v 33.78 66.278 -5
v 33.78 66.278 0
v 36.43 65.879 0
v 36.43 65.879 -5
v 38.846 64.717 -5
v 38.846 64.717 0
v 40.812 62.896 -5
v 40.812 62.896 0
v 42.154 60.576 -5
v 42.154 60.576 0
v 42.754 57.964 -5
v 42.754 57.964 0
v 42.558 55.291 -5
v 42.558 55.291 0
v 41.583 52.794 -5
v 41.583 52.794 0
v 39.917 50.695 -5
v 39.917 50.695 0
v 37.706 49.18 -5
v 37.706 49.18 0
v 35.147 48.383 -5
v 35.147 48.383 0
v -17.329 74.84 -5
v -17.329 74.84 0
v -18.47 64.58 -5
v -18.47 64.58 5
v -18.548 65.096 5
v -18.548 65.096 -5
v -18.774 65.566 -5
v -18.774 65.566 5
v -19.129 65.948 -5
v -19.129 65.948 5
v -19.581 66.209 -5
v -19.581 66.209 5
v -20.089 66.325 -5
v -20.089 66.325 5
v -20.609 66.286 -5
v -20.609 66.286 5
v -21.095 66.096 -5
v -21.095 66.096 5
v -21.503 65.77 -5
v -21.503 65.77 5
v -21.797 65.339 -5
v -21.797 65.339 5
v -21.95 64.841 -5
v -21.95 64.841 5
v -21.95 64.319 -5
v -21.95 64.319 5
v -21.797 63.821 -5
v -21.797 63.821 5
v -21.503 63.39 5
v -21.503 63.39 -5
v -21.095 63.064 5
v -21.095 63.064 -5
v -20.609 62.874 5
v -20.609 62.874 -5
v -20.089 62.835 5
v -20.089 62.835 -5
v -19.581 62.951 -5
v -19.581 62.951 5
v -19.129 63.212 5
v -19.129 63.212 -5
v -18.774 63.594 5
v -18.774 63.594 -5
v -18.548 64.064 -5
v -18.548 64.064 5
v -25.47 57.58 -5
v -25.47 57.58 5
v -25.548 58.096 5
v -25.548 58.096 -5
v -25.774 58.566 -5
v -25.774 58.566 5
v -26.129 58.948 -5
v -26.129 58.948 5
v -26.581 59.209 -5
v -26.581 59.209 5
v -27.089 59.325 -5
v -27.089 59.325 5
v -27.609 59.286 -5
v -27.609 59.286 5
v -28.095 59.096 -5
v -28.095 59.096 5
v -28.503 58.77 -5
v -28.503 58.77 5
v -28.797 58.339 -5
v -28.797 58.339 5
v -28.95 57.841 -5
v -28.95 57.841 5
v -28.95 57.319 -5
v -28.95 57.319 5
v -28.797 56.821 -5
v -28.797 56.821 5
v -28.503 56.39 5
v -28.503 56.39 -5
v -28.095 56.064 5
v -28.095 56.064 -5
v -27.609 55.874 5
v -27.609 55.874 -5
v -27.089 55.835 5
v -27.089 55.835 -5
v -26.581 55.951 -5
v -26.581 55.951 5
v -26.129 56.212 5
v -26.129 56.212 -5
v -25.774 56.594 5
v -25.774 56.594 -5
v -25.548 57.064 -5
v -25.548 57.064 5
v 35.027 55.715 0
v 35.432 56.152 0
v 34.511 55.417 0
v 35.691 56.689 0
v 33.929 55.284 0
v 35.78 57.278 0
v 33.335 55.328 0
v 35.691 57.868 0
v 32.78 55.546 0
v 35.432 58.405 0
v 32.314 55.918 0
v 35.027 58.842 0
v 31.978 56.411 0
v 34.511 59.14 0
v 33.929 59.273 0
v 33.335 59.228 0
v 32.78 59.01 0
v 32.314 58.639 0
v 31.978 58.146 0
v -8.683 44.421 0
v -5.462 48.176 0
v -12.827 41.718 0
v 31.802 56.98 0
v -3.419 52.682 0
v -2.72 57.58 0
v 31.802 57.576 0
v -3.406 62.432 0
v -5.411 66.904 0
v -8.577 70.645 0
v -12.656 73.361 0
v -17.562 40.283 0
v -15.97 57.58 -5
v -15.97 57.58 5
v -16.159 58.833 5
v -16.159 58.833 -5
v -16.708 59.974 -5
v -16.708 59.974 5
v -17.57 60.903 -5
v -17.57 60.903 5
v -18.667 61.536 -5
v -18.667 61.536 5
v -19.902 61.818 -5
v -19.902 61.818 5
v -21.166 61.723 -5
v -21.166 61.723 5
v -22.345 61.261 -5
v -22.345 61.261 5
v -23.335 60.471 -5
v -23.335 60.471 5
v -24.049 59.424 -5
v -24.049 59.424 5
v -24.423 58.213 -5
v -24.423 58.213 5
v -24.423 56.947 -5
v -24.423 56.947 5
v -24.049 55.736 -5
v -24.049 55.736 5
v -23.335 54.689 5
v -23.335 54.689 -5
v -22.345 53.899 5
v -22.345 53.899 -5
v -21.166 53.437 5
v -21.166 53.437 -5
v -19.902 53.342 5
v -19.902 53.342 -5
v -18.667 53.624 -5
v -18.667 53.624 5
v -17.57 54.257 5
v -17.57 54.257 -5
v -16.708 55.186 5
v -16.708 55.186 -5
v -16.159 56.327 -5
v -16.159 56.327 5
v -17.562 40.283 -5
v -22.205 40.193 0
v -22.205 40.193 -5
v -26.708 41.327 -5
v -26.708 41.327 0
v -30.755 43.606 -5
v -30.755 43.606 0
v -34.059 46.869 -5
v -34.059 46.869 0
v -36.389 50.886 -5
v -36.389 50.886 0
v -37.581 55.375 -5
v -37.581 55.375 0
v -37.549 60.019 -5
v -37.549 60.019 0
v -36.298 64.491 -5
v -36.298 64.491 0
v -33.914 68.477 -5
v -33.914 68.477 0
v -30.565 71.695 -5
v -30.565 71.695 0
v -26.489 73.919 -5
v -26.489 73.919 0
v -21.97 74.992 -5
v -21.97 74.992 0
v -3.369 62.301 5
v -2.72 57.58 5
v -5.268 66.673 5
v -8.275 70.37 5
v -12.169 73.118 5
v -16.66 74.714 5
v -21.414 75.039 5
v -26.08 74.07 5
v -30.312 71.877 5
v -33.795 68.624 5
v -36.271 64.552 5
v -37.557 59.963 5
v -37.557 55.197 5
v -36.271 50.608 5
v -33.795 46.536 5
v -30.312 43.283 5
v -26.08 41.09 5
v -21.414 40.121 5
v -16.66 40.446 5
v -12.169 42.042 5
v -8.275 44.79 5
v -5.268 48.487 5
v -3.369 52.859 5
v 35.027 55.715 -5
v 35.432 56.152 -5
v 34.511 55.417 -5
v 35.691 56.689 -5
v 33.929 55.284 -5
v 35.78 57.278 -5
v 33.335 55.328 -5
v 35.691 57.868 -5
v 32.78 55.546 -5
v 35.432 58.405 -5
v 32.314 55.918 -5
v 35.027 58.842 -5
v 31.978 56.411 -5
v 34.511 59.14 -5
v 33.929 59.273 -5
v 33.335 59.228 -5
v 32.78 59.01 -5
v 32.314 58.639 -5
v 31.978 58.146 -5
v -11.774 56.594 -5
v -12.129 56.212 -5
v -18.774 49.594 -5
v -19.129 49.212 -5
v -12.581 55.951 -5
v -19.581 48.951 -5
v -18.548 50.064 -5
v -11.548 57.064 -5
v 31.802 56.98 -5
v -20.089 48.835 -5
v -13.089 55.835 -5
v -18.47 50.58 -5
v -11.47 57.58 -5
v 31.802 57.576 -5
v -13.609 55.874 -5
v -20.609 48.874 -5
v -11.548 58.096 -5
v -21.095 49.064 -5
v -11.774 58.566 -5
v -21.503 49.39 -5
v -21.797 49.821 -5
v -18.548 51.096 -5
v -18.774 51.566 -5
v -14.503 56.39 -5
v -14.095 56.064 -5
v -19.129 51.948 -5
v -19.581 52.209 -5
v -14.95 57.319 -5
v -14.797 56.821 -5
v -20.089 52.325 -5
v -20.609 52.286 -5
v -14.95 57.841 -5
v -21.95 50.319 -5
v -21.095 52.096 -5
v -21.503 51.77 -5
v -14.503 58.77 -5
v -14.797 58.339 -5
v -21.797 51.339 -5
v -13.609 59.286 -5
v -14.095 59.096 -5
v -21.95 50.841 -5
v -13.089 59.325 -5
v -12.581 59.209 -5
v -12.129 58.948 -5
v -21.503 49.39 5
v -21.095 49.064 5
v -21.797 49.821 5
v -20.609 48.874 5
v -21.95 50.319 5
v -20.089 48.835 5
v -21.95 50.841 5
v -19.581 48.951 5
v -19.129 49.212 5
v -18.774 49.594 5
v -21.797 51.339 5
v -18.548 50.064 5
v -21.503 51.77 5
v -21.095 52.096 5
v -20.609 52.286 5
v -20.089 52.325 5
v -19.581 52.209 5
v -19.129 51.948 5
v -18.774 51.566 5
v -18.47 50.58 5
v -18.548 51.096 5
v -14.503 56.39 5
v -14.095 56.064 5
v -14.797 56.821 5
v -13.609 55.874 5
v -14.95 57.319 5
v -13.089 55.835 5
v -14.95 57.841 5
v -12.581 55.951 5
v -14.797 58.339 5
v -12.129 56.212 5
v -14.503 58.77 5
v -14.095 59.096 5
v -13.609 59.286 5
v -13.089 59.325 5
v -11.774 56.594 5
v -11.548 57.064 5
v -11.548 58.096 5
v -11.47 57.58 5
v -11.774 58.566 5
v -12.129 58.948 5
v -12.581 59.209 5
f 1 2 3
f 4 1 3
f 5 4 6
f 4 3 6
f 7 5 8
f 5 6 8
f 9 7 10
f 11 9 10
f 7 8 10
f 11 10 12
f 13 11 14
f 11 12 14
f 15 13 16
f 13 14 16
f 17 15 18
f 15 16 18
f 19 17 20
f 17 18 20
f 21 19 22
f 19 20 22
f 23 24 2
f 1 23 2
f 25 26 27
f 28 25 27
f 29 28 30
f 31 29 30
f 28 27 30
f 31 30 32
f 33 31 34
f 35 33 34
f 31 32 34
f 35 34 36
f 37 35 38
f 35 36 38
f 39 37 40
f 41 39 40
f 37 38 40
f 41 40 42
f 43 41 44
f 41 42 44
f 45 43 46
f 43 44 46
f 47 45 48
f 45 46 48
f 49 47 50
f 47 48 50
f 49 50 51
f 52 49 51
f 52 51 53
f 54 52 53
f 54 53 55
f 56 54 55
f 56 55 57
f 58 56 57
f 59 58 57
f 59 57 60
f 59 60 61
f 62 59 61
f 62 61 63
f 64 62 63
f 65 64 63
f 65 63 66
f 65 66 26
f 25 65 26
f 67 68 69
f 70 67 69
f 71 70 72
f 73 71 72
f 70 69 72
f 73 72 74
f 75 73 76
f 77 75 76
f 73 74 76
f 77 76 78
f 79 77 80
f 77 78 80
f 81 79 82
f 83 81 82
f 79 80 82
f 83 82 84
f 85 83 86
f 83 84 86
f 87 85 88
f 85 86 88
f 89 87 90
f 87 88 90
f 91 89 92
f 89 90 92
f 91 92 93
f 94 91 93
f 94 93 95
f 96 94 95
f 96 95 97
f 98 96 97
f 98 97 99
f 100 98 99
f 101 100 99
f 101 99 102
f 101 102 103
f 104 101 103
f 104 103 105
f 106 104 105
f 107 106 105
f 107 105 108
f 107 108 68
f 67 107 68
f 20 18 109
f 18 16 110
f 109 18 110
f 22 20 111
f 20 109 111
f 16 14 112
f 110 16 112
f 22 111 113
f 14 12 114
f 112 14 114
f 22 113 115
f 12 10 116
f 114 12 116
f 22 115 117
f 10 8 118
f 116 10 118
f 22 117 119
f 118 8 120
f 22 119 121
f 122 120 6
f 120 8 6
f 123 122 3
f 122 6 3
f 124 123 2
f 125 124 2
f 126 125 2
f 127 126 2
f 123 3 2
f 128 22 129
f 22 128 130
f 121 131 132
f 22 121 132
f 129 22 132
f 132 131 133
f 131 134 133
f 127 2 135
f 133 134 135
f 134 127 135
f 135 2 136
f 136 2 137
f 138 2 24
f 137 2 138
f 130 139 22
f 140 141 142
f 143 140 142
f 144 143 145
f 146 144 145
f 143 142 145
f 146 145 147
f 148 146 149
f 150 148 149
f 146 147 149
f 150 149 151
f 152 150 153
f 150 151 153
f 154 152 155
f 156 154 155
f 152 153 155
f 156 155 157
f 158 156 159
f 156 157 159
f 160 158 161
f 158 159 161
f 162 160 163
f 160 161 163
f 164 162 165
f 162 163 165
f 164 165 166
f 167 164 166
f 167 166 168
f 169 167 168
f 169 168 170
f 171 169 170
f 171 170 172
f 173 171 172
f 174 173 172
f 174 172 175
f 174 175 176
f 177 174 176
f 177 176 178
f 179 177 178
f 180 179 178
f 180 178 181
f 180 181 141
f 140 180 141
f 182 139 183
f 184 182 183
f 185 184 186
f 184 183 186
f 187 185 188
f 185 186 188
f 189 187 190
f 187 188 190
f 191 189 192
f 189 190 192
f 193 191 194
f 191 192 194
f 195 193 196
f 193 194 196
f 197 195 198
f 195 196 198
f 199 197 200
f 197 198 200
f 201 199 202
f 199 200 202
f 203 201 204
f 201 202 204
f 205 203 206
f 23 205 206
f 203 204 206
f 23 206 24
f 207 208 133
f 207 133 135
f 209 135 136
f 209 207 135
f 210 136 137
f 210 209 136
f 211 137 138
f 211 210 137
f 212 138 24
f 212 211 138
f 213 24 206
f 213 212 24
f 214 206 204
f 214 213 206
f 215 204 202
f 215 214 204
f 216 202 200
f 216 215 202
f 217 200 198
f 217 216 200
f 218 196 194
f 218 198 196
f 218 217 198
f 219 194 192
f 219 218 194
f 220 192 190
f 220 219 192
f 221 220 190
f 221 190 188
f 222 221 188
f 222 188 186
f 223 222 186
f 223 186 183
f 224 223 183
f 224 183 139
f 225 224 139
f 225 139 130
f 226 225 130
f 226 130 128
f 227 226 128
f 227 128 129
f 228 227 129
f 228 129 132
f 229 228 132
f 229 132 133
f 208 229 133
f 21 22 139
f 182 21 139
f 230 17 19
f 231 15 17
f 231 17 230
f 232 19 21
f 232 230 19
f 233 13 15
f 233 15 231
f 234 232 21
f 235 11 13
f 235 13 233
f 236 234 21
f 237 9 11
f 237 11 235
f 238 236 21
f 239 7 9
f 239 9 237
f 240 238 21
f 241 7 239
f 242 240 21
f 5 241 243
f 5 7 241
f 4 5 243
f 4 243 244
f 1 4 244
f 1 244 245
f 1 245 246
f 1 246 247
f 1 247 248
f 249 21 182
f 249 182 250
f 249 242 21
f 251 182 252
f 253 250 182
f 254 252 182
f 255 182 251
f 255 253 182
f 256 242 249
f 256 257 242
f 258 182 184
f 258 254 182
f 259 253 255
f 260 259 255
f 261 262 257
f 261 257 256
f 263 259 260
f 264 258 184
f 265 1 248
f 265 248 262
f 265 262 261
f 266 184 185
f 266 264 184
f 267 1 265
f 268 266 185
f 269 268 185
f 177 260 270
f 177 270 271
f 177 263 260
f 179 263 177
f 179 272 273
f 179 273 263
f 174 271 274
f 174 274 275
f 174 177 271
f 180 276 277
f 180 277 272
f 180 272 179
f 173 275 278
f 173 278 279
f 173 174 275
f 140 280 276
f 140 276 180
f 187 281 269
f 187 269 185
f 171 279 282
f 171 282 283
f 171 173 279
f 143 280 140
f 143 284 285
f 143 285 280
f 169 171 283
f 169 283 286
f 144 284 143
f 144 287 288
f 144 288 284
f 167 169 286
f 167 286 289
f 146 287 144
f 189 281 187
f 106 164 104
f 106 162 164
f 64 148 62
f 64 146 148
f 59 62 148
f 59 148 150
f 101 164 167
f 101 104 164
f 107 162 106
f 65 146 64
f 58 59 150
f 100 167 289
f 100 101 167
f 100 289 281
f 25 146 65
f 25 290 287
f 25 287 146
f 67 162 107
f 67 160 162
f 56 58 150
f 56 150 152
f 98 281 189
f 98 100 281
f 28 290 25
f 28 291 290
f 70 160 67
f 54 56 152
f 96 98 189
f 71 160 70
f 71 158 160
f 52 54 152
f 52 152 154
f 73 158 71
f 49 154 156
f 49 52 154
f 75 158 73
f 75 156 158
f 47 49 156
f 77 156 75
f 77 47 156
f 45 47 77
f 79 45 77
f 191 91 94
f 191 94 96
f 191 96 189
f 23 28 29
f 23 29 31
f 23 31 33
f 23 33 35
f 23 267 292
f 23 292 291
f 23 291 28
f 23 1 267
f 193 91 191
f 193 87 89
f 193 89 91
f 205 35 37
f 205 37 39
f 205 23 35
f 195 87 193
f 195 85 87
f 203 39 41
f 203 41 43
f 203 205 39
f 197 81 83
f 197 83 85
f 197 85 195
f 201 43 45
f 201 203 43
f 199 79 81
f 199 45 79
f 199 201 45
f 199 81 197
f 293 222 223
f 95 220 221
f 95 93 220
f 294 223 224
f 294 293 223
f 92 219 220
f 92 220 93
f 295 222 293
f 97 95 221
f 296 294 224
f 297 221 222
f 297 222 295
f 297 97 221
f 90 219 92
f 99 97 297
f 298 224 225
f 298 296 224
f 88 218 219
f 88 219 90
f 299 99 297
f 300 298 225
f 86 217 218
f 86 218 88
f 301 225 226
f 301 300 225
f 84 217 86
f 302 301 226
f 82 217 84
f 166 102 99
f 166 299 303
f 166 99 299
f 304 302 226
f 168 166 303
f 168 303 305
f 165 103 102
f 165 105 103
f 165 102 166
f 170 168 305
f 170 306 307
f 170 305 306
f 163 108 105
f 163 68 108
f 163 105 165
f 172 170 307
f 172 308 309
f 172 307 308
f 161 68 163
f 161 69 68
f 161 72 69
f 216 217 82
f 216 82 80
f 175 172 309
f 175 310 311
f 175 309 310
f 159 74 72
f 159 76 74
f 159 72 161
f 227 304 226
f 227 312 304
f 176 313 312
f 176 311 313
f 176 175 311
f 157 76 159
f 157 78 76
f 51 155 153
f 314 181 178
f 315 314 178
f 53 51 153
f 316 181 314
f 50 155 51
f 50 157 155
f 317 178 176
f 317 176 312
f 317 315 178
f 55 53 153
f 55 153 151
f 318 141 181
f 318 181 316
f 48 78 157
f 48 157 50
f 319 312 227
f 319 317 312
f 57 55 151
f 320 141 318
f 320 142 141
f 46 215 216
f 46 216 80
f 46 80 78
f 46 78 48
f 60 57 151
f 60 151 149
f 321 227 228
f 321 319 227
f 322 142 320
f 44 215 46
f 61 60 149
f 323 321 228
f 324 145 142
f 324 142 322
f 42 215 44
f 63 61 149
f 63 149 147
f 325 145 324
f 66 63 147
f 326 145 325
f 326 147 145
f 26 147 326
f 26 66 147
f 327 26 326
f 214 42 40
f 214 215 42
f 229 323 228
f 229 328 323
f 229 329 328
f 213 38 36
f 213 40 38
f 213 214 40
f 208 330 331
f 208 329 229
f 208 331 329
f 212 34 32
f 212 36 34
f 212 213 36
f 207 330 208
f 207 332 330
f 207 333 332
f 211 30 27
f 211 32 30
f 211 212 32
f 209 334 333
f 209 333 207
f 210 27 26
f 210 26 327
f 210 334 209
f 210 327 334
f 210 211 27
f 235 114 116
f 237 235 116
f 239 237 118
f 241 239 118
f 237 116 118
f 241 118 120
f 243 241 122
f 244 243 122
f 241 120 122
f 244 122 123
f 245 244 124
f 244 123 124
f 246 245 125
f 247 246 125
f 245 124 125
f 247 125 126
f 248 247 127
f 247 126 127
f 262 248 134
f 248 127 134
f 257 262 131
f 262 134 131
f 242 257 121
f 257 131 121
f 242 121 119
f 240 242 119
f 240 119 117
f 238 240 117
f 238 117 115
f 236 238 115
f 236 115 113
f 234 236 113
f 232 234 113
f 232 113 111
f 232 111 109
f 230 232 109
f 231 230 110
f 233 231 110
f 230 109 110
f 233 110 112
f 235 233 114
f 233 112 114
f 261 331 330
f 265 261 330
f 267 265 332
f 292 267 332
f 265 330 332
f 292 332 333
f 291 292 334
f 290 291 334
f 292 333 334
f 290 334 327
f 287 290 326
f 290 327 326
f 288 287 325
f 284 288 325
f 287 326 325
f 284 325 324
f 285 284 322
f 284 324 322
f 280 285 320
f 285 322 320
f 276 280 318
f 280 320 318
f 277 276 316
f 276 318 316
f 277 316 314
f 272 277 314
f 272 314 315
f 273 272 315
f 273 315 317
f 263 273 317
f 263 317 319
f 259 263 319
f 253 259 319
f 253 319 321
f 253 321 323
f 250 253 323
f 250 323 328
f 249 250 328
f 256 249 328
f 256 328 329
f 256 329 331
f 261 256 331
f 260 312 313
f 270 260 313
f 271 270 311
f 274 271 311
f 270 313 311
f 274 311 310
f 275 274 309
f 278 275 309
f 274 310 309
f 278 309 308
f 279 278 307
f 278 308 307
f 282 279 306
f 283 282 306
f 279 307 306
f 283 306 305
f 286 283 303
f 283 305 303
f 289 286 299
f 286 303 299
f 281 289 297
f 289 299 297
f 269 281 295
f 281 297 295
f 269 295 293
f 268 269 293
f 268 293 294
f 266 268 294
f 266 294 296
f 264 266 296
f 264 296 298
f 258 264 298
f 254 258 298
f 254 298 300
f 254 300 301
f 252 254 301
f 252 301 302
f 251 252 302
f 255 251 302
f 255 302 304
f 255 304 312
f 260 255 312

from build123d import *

# Parameters (mm, degrees)
SKETCH2_R           = 4.25
SKETCH2_R_2         = 2
BOSS_EXTRUDE1_DEPTH = 5
SKETCH_1_R          = 1.75
CUT_EXTRUDE_1_DEPTH = 10
EXTRUDE_START       = 5
SKETCH_2_R          = 17.5
SKETCH_2_R_2        = 1.75
SKETCH_2_R_3        = 4.25
EXTRUDE_1_DEPTH     = 5


with BuildPart() as part:
    # Sketch2 → Boss-Extrude1 (new body)
    with BuildSketch(Plane.XY):
        with BuildLine():
            Line((-17.328874887, 74.839530577), (33.78000003, 66.278338859))
            ThreePointArc((33.78000003, 66.278338859), (42.753857637, 57.963816533), (35.14697315, 48.382756557))
            Line((35.14697315, 48.382756557), (-17.561996681, 40.283034413))
            ThreePointArc((-17.561996681, 40.283034413), (-37.719601772, 57.698054173), (-17.328874887, 74.839530577))
        make_face()
        with Locations((-20.21999997, 57.58)):
            Circle(SKETCH2_R, mode=Mode.SUBTRACT)
        with Locations((33.78000003, 57.278338859)):
            Circle(SKETCH2_R_2, mode=Mode.SUBTRACT)
    extrude(amount=-BOSS_EXTRUDE1_DEPTH)

    # 草图1 → 切除-拉伸1 (cut)
    with BuildSketch(Plane.XY):
        with Locations((-13.21999997, 57.58)):
            Circle(SKETCH_1_R)
        with Locations((-27.21999997, 57.58)):
            Circle(SKETCH_1_R)
        with Locations((-20.21999997, 64.58)):
            Circle(SKETCH_1_R)
        with Locations((-20.21999997, 50.58)):
            Circle(SKETCH_1_R)
    extrude(amount=-CUT_EXTRUDE_1_DEPTH, mode=Mode.SUBTRACT)

    # 草图2 → 凸台-拉伸1 (add)
    with BuildSketch(Plane.XY.offset(EXTRUDE_START)):
        with Locations((-20.21999997, 57.58)):
            Circle(SKETCH_2_R)
        with Locations((-27.21999997, 57.58)):
            Circle(SKETCH_2_R_2, mode=Mode.SUBTRACT)
        with Locations((-20.21999997, 50.58)):
            Circle(SKETCH_2_R_2, mode=Mode.SUBTRACT)
        with Locations((-13.21999997, 57.58)):
            Circle(SKETCH_2_R_2, mode=Mode.SUBTRACT)
        with Locations((-20.21999997, 64.58)):
            Circle(SKETCH_2_R_2, mode=Mode.SUBTRACT)
        with Locations((-20.21999997, 57.58)):
            Circle(SKETCH_2_R_3, mode=Mode.SUBTRACT)
    extrude(amount=-EXTRUDE_1_DEPTH)


solid = part.part
